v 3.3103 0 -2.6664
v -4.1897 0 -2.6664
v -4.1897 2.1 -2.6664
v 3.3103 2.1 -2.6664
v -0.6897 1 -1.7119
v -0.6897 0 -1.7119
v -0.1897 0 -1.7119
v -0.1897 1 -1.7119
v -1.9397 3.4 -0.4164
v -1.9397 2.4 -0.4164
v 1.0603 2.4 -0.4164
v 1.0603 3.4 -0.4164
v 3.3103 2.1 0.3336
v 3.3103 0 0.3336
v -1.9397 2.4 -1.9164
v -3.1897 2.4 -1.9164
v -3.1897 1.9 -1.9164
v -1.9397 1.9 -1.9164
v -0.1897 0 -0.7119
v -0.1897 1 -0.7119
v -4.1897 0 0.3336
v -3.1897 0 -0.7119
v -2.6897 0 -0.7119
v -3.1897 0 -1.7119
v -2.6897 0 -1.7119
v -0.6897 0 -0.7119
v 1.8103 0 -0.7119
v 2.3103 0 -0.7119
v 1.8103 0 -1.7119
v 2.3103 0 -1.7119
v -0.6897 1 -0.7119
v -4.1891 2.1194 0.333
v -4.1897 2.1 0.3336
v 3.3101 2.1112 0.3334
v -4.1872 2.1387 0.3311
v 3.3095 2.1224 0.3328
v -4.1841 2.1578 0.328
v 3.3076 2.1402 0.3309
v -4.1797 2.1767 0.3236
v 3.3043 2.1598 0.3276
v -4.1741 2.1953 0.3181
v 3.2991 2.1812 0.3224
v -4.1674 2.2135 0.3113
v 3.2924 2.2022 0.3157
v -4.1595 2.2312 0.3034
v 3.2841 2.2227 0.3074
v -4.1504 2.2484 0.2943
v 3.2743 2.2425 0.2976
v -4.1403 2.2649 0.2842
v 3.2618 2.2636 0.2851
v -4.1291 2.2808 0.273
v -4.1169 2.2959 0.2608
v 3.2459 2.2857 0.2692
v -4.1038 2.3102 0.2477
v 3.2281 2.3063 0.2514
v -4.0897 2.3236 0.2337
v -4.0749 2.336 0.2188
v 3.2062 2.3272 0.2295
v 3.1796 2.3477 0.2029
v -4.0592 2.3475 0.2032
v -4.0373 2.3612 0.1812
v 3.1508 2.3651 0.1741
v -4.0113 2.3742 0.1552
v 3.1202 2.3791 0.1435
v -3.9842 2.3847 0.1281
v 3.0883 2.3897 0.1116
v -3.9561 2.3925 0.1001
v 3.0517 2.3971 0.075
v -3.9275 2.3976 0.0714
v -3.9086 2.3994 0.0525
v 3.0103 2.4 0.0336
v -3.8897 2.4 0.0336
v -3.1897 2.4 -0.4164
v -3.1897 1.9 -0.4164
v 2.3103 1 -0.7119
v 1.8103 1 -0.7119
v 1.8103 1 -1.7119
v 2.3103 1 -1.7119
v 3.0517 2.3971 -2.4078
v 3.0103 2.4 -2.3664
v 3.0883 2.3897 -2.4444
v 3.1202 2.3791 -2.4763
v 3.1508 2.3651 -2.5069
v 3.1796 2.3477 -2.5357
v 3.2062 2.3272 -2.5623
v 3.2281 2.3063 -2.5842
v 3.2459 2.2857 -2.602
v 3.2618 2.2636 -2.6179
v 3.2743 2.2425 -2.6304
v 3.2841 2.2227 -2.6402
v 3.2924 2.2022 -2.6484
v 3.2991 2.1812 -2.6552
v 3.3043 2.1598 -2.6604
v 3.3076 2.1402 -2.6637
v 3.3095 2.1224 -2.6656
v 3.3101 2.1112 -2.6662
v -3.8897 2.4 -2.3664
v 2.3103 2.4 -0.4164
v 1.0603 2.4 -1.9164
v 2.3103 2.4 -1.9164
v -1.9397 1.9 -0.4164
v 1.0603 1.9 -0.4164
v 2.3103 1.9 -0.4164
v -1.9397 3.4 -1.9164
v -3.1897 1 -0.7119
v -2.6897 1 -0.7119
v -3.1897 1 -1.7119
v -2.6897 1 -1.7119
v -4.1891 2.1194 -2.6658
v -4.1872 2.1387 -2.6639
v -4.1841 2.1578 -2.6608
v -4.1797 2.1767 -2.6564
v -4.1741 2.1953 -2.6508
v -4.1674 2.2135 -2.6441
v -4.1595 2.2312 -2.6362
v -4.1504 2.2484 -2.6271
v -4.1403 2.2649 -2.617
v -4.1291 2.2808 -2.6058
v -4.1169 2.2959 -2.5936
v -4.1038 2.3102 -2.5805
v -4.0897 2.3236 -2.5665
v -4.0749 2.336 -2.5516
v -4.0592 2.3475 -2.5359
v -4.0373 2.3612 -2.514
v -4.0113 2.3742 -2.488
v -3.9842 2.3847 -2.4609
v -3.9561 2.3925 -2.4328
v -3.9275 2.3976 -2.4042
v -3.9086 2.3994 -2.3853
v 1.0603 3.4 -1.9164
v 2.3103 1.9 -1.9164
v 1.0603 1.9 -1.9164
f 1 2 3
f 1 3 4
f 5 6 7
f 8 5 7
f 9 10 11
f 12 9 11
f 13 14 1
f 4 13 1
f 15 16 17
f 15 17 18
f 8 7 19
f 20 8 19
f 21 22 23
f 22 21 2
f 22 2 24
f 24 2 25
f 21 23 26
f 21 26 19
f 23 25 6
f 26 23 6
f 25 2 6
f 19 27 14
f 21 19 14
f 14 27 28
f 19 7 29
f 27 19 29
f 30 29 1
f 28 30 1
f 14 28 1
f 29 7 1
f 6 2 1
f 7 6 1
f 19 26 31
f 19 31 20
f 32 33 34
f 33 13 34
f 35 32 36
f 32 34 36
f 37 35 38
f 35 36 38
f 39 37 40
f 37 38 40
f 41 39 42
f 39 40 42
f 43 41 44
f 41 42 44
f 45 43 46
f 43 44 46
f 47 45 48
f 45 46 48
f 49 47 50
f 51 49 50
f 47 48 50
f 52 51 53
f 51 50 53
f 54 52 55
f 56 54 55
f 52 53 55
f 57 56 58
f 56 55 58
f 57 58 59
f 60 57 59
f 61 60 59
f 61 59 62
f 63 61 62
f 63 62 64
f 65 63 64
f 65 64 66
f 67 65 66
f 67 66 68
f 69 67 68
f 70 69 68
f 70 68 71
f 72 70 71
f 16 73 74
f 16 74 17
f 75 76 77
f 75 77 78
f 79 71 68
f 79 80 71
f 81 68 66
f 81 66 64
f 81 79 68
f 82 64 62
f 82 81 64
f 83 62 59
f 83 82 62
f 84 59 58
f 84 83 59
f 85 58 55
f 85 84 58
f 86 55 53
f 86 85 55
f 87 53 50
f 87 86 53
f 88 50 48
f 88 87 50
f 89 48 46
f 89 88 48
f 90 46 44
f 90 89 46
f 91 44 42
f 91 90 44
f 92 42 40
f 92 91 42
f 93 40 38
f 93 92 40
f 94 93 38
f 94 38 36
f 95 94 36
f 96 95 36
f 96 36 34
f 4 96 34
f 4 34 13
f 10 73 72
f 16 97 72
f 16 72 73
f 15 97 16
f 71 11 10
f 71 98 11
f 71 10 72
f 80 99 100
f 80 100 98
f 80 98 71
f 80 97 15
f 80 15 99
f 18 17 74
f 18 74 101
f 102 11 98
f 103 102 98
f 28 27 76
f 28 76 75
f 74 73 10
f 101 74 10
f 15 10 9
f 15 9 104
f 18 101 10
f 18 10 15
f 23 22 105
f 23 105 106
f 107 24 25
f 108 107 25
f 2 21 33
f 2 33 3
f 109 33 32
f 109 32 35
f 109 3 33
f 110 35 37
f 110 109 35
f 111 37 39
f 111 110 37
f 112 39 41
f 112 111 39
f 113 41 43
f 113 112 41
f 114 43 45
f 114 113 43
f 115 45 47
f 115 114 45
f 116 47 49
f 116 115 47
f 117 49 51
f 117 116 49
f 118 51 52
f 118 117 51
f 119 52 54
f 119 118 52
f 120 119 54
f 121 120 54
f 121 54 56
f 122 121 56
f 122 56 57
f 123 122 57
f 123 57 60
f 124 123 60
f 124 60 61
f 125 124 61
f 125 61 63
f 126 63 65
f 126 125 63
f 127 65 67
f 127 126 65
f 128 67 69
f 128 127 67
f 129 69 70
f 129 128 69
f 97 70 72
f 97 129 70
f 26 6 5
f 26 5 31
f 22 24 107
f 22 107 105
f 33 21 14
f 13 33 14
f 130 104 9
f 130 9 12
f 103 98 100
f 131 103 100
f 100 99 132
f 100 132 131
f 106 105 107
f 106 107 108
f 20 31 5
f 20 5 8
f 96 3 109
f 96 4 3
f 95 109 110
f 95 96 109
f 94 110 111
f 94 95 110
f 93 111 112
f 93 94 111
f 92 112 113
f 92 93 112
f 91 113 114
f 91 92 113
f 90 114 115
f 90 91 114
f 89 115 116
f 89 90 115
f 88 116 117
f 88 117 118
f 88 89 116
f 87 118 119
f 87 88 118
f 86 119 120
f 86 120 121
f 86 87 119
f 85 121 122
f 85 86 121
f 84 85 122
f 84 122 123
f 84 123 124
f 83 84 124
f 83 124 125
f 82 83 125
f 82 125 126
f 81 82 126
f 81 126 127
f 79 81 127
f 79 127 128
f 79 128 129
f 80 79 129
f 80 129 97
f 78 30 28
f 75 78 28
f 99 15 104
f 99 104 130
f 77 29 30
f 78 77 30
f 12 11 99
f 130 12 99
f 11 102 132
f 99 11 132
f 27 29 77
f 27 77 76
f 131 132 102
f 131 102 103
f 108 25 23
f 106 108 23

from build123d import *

# Parameters (mm, degrees)
SKETCH1_W           = 7.5
SKETCH1_H           = 3
BOSS_EXTRUDE1_DEPTH = 2.4
SKETCH2_W           = 3
SKETCH2_H           = 1.5
BOSS_EXTRUDE2_DEPTH = 1
SKETCH3_W           = 1.25
SKETCH3_H           = 1.5
CUT_EXTRUDE1_DEPTH  = 0.5
SKETCH4_W           = 0.5
SKETCH4_H           = 1
CUT_EXTRUDE2_DEPTH  = 1
FILLET1_R           = 0.3


with BuildPart() as part:
    # Sketch1 → Boss-Extrude1 (new body)
    with BuildSketch(Plane(origin=(0, 0, 0), x_dir=(1, 0, 0), z_dir=(0, 1, 0))):
        with Locations((-0.439685246, 1.166396104)):
            Rectangle(SKETCH1_W, SKETCH1_H)
    extrude(amount=BOSS_EXTRUDE1_DEPTH)

    # Sketch2 → Boss-Extrude2 (add)
    with BuildSketch(Plane(origin=(0, 2.4, 0), x_dir=(1, 0, 0), z_dir=(0, 1, 0))):
        with Locations((-0.439685246, 1.166396104)):
            Rectangle(SKETCH2_W, SKETCH2_H)
    extrude(amount=BOSS_EXTRUDE2_DEPTH)

    # Sketch3 → Cut-Extrude1 (cut)
    with BuildSketch(Plane(origin=(0, 2.4, 0), x_dir=(1, 0, 0), z_dir=(0, 1, 0))):
        with Locations((1.685314754, 1.166396104)):
            Rectangle(SKETCH3_W, SKETCH3_H)
        with Locations((-2.564685246, 1.166396104)):
            Rectangle(SKETCH3_W, SKETCH3_H)
    extrude(amount=-CUT_EXTRUDE1_DEPTH, mode=Mode.SUBTRACT)

    # Sketch4 → Cut-Extrude2 (cut)
    with BuildSketch(Plane.XZ):
        with Locations((2.060314754, -1.211874682)):
            Rectangle(SKETCH4_W, SKETCH4_H)
        with Locations((-0.439685246, -1.211874682)):
            Rectangle(SKETCH4_W, SKETCH4_H)
        with Locations((-2.939685246, -1.211874682)):
            Rectangle(SKETCH4_W, SKETCH4_H)
    extrude(amount=-CUT_EXTRUDE2_DEPTH, mode=Mode.SUBTRACT)

    # Fillet1
    fillet1_edges = [part.edges().sort_by_distance(p)[0] for p in [
        (3.310314754, 2.4, -1.166396104),
        (-0.439685246, 2.4, -2.666396104),
        (-4.189685246, 2.4, -1.166396104),
        (-0.439685246, 2.4, 0.333603896),
    ]]
    fillet(fillet1_edges, radius=FILLET1_R)


solid = part.part
